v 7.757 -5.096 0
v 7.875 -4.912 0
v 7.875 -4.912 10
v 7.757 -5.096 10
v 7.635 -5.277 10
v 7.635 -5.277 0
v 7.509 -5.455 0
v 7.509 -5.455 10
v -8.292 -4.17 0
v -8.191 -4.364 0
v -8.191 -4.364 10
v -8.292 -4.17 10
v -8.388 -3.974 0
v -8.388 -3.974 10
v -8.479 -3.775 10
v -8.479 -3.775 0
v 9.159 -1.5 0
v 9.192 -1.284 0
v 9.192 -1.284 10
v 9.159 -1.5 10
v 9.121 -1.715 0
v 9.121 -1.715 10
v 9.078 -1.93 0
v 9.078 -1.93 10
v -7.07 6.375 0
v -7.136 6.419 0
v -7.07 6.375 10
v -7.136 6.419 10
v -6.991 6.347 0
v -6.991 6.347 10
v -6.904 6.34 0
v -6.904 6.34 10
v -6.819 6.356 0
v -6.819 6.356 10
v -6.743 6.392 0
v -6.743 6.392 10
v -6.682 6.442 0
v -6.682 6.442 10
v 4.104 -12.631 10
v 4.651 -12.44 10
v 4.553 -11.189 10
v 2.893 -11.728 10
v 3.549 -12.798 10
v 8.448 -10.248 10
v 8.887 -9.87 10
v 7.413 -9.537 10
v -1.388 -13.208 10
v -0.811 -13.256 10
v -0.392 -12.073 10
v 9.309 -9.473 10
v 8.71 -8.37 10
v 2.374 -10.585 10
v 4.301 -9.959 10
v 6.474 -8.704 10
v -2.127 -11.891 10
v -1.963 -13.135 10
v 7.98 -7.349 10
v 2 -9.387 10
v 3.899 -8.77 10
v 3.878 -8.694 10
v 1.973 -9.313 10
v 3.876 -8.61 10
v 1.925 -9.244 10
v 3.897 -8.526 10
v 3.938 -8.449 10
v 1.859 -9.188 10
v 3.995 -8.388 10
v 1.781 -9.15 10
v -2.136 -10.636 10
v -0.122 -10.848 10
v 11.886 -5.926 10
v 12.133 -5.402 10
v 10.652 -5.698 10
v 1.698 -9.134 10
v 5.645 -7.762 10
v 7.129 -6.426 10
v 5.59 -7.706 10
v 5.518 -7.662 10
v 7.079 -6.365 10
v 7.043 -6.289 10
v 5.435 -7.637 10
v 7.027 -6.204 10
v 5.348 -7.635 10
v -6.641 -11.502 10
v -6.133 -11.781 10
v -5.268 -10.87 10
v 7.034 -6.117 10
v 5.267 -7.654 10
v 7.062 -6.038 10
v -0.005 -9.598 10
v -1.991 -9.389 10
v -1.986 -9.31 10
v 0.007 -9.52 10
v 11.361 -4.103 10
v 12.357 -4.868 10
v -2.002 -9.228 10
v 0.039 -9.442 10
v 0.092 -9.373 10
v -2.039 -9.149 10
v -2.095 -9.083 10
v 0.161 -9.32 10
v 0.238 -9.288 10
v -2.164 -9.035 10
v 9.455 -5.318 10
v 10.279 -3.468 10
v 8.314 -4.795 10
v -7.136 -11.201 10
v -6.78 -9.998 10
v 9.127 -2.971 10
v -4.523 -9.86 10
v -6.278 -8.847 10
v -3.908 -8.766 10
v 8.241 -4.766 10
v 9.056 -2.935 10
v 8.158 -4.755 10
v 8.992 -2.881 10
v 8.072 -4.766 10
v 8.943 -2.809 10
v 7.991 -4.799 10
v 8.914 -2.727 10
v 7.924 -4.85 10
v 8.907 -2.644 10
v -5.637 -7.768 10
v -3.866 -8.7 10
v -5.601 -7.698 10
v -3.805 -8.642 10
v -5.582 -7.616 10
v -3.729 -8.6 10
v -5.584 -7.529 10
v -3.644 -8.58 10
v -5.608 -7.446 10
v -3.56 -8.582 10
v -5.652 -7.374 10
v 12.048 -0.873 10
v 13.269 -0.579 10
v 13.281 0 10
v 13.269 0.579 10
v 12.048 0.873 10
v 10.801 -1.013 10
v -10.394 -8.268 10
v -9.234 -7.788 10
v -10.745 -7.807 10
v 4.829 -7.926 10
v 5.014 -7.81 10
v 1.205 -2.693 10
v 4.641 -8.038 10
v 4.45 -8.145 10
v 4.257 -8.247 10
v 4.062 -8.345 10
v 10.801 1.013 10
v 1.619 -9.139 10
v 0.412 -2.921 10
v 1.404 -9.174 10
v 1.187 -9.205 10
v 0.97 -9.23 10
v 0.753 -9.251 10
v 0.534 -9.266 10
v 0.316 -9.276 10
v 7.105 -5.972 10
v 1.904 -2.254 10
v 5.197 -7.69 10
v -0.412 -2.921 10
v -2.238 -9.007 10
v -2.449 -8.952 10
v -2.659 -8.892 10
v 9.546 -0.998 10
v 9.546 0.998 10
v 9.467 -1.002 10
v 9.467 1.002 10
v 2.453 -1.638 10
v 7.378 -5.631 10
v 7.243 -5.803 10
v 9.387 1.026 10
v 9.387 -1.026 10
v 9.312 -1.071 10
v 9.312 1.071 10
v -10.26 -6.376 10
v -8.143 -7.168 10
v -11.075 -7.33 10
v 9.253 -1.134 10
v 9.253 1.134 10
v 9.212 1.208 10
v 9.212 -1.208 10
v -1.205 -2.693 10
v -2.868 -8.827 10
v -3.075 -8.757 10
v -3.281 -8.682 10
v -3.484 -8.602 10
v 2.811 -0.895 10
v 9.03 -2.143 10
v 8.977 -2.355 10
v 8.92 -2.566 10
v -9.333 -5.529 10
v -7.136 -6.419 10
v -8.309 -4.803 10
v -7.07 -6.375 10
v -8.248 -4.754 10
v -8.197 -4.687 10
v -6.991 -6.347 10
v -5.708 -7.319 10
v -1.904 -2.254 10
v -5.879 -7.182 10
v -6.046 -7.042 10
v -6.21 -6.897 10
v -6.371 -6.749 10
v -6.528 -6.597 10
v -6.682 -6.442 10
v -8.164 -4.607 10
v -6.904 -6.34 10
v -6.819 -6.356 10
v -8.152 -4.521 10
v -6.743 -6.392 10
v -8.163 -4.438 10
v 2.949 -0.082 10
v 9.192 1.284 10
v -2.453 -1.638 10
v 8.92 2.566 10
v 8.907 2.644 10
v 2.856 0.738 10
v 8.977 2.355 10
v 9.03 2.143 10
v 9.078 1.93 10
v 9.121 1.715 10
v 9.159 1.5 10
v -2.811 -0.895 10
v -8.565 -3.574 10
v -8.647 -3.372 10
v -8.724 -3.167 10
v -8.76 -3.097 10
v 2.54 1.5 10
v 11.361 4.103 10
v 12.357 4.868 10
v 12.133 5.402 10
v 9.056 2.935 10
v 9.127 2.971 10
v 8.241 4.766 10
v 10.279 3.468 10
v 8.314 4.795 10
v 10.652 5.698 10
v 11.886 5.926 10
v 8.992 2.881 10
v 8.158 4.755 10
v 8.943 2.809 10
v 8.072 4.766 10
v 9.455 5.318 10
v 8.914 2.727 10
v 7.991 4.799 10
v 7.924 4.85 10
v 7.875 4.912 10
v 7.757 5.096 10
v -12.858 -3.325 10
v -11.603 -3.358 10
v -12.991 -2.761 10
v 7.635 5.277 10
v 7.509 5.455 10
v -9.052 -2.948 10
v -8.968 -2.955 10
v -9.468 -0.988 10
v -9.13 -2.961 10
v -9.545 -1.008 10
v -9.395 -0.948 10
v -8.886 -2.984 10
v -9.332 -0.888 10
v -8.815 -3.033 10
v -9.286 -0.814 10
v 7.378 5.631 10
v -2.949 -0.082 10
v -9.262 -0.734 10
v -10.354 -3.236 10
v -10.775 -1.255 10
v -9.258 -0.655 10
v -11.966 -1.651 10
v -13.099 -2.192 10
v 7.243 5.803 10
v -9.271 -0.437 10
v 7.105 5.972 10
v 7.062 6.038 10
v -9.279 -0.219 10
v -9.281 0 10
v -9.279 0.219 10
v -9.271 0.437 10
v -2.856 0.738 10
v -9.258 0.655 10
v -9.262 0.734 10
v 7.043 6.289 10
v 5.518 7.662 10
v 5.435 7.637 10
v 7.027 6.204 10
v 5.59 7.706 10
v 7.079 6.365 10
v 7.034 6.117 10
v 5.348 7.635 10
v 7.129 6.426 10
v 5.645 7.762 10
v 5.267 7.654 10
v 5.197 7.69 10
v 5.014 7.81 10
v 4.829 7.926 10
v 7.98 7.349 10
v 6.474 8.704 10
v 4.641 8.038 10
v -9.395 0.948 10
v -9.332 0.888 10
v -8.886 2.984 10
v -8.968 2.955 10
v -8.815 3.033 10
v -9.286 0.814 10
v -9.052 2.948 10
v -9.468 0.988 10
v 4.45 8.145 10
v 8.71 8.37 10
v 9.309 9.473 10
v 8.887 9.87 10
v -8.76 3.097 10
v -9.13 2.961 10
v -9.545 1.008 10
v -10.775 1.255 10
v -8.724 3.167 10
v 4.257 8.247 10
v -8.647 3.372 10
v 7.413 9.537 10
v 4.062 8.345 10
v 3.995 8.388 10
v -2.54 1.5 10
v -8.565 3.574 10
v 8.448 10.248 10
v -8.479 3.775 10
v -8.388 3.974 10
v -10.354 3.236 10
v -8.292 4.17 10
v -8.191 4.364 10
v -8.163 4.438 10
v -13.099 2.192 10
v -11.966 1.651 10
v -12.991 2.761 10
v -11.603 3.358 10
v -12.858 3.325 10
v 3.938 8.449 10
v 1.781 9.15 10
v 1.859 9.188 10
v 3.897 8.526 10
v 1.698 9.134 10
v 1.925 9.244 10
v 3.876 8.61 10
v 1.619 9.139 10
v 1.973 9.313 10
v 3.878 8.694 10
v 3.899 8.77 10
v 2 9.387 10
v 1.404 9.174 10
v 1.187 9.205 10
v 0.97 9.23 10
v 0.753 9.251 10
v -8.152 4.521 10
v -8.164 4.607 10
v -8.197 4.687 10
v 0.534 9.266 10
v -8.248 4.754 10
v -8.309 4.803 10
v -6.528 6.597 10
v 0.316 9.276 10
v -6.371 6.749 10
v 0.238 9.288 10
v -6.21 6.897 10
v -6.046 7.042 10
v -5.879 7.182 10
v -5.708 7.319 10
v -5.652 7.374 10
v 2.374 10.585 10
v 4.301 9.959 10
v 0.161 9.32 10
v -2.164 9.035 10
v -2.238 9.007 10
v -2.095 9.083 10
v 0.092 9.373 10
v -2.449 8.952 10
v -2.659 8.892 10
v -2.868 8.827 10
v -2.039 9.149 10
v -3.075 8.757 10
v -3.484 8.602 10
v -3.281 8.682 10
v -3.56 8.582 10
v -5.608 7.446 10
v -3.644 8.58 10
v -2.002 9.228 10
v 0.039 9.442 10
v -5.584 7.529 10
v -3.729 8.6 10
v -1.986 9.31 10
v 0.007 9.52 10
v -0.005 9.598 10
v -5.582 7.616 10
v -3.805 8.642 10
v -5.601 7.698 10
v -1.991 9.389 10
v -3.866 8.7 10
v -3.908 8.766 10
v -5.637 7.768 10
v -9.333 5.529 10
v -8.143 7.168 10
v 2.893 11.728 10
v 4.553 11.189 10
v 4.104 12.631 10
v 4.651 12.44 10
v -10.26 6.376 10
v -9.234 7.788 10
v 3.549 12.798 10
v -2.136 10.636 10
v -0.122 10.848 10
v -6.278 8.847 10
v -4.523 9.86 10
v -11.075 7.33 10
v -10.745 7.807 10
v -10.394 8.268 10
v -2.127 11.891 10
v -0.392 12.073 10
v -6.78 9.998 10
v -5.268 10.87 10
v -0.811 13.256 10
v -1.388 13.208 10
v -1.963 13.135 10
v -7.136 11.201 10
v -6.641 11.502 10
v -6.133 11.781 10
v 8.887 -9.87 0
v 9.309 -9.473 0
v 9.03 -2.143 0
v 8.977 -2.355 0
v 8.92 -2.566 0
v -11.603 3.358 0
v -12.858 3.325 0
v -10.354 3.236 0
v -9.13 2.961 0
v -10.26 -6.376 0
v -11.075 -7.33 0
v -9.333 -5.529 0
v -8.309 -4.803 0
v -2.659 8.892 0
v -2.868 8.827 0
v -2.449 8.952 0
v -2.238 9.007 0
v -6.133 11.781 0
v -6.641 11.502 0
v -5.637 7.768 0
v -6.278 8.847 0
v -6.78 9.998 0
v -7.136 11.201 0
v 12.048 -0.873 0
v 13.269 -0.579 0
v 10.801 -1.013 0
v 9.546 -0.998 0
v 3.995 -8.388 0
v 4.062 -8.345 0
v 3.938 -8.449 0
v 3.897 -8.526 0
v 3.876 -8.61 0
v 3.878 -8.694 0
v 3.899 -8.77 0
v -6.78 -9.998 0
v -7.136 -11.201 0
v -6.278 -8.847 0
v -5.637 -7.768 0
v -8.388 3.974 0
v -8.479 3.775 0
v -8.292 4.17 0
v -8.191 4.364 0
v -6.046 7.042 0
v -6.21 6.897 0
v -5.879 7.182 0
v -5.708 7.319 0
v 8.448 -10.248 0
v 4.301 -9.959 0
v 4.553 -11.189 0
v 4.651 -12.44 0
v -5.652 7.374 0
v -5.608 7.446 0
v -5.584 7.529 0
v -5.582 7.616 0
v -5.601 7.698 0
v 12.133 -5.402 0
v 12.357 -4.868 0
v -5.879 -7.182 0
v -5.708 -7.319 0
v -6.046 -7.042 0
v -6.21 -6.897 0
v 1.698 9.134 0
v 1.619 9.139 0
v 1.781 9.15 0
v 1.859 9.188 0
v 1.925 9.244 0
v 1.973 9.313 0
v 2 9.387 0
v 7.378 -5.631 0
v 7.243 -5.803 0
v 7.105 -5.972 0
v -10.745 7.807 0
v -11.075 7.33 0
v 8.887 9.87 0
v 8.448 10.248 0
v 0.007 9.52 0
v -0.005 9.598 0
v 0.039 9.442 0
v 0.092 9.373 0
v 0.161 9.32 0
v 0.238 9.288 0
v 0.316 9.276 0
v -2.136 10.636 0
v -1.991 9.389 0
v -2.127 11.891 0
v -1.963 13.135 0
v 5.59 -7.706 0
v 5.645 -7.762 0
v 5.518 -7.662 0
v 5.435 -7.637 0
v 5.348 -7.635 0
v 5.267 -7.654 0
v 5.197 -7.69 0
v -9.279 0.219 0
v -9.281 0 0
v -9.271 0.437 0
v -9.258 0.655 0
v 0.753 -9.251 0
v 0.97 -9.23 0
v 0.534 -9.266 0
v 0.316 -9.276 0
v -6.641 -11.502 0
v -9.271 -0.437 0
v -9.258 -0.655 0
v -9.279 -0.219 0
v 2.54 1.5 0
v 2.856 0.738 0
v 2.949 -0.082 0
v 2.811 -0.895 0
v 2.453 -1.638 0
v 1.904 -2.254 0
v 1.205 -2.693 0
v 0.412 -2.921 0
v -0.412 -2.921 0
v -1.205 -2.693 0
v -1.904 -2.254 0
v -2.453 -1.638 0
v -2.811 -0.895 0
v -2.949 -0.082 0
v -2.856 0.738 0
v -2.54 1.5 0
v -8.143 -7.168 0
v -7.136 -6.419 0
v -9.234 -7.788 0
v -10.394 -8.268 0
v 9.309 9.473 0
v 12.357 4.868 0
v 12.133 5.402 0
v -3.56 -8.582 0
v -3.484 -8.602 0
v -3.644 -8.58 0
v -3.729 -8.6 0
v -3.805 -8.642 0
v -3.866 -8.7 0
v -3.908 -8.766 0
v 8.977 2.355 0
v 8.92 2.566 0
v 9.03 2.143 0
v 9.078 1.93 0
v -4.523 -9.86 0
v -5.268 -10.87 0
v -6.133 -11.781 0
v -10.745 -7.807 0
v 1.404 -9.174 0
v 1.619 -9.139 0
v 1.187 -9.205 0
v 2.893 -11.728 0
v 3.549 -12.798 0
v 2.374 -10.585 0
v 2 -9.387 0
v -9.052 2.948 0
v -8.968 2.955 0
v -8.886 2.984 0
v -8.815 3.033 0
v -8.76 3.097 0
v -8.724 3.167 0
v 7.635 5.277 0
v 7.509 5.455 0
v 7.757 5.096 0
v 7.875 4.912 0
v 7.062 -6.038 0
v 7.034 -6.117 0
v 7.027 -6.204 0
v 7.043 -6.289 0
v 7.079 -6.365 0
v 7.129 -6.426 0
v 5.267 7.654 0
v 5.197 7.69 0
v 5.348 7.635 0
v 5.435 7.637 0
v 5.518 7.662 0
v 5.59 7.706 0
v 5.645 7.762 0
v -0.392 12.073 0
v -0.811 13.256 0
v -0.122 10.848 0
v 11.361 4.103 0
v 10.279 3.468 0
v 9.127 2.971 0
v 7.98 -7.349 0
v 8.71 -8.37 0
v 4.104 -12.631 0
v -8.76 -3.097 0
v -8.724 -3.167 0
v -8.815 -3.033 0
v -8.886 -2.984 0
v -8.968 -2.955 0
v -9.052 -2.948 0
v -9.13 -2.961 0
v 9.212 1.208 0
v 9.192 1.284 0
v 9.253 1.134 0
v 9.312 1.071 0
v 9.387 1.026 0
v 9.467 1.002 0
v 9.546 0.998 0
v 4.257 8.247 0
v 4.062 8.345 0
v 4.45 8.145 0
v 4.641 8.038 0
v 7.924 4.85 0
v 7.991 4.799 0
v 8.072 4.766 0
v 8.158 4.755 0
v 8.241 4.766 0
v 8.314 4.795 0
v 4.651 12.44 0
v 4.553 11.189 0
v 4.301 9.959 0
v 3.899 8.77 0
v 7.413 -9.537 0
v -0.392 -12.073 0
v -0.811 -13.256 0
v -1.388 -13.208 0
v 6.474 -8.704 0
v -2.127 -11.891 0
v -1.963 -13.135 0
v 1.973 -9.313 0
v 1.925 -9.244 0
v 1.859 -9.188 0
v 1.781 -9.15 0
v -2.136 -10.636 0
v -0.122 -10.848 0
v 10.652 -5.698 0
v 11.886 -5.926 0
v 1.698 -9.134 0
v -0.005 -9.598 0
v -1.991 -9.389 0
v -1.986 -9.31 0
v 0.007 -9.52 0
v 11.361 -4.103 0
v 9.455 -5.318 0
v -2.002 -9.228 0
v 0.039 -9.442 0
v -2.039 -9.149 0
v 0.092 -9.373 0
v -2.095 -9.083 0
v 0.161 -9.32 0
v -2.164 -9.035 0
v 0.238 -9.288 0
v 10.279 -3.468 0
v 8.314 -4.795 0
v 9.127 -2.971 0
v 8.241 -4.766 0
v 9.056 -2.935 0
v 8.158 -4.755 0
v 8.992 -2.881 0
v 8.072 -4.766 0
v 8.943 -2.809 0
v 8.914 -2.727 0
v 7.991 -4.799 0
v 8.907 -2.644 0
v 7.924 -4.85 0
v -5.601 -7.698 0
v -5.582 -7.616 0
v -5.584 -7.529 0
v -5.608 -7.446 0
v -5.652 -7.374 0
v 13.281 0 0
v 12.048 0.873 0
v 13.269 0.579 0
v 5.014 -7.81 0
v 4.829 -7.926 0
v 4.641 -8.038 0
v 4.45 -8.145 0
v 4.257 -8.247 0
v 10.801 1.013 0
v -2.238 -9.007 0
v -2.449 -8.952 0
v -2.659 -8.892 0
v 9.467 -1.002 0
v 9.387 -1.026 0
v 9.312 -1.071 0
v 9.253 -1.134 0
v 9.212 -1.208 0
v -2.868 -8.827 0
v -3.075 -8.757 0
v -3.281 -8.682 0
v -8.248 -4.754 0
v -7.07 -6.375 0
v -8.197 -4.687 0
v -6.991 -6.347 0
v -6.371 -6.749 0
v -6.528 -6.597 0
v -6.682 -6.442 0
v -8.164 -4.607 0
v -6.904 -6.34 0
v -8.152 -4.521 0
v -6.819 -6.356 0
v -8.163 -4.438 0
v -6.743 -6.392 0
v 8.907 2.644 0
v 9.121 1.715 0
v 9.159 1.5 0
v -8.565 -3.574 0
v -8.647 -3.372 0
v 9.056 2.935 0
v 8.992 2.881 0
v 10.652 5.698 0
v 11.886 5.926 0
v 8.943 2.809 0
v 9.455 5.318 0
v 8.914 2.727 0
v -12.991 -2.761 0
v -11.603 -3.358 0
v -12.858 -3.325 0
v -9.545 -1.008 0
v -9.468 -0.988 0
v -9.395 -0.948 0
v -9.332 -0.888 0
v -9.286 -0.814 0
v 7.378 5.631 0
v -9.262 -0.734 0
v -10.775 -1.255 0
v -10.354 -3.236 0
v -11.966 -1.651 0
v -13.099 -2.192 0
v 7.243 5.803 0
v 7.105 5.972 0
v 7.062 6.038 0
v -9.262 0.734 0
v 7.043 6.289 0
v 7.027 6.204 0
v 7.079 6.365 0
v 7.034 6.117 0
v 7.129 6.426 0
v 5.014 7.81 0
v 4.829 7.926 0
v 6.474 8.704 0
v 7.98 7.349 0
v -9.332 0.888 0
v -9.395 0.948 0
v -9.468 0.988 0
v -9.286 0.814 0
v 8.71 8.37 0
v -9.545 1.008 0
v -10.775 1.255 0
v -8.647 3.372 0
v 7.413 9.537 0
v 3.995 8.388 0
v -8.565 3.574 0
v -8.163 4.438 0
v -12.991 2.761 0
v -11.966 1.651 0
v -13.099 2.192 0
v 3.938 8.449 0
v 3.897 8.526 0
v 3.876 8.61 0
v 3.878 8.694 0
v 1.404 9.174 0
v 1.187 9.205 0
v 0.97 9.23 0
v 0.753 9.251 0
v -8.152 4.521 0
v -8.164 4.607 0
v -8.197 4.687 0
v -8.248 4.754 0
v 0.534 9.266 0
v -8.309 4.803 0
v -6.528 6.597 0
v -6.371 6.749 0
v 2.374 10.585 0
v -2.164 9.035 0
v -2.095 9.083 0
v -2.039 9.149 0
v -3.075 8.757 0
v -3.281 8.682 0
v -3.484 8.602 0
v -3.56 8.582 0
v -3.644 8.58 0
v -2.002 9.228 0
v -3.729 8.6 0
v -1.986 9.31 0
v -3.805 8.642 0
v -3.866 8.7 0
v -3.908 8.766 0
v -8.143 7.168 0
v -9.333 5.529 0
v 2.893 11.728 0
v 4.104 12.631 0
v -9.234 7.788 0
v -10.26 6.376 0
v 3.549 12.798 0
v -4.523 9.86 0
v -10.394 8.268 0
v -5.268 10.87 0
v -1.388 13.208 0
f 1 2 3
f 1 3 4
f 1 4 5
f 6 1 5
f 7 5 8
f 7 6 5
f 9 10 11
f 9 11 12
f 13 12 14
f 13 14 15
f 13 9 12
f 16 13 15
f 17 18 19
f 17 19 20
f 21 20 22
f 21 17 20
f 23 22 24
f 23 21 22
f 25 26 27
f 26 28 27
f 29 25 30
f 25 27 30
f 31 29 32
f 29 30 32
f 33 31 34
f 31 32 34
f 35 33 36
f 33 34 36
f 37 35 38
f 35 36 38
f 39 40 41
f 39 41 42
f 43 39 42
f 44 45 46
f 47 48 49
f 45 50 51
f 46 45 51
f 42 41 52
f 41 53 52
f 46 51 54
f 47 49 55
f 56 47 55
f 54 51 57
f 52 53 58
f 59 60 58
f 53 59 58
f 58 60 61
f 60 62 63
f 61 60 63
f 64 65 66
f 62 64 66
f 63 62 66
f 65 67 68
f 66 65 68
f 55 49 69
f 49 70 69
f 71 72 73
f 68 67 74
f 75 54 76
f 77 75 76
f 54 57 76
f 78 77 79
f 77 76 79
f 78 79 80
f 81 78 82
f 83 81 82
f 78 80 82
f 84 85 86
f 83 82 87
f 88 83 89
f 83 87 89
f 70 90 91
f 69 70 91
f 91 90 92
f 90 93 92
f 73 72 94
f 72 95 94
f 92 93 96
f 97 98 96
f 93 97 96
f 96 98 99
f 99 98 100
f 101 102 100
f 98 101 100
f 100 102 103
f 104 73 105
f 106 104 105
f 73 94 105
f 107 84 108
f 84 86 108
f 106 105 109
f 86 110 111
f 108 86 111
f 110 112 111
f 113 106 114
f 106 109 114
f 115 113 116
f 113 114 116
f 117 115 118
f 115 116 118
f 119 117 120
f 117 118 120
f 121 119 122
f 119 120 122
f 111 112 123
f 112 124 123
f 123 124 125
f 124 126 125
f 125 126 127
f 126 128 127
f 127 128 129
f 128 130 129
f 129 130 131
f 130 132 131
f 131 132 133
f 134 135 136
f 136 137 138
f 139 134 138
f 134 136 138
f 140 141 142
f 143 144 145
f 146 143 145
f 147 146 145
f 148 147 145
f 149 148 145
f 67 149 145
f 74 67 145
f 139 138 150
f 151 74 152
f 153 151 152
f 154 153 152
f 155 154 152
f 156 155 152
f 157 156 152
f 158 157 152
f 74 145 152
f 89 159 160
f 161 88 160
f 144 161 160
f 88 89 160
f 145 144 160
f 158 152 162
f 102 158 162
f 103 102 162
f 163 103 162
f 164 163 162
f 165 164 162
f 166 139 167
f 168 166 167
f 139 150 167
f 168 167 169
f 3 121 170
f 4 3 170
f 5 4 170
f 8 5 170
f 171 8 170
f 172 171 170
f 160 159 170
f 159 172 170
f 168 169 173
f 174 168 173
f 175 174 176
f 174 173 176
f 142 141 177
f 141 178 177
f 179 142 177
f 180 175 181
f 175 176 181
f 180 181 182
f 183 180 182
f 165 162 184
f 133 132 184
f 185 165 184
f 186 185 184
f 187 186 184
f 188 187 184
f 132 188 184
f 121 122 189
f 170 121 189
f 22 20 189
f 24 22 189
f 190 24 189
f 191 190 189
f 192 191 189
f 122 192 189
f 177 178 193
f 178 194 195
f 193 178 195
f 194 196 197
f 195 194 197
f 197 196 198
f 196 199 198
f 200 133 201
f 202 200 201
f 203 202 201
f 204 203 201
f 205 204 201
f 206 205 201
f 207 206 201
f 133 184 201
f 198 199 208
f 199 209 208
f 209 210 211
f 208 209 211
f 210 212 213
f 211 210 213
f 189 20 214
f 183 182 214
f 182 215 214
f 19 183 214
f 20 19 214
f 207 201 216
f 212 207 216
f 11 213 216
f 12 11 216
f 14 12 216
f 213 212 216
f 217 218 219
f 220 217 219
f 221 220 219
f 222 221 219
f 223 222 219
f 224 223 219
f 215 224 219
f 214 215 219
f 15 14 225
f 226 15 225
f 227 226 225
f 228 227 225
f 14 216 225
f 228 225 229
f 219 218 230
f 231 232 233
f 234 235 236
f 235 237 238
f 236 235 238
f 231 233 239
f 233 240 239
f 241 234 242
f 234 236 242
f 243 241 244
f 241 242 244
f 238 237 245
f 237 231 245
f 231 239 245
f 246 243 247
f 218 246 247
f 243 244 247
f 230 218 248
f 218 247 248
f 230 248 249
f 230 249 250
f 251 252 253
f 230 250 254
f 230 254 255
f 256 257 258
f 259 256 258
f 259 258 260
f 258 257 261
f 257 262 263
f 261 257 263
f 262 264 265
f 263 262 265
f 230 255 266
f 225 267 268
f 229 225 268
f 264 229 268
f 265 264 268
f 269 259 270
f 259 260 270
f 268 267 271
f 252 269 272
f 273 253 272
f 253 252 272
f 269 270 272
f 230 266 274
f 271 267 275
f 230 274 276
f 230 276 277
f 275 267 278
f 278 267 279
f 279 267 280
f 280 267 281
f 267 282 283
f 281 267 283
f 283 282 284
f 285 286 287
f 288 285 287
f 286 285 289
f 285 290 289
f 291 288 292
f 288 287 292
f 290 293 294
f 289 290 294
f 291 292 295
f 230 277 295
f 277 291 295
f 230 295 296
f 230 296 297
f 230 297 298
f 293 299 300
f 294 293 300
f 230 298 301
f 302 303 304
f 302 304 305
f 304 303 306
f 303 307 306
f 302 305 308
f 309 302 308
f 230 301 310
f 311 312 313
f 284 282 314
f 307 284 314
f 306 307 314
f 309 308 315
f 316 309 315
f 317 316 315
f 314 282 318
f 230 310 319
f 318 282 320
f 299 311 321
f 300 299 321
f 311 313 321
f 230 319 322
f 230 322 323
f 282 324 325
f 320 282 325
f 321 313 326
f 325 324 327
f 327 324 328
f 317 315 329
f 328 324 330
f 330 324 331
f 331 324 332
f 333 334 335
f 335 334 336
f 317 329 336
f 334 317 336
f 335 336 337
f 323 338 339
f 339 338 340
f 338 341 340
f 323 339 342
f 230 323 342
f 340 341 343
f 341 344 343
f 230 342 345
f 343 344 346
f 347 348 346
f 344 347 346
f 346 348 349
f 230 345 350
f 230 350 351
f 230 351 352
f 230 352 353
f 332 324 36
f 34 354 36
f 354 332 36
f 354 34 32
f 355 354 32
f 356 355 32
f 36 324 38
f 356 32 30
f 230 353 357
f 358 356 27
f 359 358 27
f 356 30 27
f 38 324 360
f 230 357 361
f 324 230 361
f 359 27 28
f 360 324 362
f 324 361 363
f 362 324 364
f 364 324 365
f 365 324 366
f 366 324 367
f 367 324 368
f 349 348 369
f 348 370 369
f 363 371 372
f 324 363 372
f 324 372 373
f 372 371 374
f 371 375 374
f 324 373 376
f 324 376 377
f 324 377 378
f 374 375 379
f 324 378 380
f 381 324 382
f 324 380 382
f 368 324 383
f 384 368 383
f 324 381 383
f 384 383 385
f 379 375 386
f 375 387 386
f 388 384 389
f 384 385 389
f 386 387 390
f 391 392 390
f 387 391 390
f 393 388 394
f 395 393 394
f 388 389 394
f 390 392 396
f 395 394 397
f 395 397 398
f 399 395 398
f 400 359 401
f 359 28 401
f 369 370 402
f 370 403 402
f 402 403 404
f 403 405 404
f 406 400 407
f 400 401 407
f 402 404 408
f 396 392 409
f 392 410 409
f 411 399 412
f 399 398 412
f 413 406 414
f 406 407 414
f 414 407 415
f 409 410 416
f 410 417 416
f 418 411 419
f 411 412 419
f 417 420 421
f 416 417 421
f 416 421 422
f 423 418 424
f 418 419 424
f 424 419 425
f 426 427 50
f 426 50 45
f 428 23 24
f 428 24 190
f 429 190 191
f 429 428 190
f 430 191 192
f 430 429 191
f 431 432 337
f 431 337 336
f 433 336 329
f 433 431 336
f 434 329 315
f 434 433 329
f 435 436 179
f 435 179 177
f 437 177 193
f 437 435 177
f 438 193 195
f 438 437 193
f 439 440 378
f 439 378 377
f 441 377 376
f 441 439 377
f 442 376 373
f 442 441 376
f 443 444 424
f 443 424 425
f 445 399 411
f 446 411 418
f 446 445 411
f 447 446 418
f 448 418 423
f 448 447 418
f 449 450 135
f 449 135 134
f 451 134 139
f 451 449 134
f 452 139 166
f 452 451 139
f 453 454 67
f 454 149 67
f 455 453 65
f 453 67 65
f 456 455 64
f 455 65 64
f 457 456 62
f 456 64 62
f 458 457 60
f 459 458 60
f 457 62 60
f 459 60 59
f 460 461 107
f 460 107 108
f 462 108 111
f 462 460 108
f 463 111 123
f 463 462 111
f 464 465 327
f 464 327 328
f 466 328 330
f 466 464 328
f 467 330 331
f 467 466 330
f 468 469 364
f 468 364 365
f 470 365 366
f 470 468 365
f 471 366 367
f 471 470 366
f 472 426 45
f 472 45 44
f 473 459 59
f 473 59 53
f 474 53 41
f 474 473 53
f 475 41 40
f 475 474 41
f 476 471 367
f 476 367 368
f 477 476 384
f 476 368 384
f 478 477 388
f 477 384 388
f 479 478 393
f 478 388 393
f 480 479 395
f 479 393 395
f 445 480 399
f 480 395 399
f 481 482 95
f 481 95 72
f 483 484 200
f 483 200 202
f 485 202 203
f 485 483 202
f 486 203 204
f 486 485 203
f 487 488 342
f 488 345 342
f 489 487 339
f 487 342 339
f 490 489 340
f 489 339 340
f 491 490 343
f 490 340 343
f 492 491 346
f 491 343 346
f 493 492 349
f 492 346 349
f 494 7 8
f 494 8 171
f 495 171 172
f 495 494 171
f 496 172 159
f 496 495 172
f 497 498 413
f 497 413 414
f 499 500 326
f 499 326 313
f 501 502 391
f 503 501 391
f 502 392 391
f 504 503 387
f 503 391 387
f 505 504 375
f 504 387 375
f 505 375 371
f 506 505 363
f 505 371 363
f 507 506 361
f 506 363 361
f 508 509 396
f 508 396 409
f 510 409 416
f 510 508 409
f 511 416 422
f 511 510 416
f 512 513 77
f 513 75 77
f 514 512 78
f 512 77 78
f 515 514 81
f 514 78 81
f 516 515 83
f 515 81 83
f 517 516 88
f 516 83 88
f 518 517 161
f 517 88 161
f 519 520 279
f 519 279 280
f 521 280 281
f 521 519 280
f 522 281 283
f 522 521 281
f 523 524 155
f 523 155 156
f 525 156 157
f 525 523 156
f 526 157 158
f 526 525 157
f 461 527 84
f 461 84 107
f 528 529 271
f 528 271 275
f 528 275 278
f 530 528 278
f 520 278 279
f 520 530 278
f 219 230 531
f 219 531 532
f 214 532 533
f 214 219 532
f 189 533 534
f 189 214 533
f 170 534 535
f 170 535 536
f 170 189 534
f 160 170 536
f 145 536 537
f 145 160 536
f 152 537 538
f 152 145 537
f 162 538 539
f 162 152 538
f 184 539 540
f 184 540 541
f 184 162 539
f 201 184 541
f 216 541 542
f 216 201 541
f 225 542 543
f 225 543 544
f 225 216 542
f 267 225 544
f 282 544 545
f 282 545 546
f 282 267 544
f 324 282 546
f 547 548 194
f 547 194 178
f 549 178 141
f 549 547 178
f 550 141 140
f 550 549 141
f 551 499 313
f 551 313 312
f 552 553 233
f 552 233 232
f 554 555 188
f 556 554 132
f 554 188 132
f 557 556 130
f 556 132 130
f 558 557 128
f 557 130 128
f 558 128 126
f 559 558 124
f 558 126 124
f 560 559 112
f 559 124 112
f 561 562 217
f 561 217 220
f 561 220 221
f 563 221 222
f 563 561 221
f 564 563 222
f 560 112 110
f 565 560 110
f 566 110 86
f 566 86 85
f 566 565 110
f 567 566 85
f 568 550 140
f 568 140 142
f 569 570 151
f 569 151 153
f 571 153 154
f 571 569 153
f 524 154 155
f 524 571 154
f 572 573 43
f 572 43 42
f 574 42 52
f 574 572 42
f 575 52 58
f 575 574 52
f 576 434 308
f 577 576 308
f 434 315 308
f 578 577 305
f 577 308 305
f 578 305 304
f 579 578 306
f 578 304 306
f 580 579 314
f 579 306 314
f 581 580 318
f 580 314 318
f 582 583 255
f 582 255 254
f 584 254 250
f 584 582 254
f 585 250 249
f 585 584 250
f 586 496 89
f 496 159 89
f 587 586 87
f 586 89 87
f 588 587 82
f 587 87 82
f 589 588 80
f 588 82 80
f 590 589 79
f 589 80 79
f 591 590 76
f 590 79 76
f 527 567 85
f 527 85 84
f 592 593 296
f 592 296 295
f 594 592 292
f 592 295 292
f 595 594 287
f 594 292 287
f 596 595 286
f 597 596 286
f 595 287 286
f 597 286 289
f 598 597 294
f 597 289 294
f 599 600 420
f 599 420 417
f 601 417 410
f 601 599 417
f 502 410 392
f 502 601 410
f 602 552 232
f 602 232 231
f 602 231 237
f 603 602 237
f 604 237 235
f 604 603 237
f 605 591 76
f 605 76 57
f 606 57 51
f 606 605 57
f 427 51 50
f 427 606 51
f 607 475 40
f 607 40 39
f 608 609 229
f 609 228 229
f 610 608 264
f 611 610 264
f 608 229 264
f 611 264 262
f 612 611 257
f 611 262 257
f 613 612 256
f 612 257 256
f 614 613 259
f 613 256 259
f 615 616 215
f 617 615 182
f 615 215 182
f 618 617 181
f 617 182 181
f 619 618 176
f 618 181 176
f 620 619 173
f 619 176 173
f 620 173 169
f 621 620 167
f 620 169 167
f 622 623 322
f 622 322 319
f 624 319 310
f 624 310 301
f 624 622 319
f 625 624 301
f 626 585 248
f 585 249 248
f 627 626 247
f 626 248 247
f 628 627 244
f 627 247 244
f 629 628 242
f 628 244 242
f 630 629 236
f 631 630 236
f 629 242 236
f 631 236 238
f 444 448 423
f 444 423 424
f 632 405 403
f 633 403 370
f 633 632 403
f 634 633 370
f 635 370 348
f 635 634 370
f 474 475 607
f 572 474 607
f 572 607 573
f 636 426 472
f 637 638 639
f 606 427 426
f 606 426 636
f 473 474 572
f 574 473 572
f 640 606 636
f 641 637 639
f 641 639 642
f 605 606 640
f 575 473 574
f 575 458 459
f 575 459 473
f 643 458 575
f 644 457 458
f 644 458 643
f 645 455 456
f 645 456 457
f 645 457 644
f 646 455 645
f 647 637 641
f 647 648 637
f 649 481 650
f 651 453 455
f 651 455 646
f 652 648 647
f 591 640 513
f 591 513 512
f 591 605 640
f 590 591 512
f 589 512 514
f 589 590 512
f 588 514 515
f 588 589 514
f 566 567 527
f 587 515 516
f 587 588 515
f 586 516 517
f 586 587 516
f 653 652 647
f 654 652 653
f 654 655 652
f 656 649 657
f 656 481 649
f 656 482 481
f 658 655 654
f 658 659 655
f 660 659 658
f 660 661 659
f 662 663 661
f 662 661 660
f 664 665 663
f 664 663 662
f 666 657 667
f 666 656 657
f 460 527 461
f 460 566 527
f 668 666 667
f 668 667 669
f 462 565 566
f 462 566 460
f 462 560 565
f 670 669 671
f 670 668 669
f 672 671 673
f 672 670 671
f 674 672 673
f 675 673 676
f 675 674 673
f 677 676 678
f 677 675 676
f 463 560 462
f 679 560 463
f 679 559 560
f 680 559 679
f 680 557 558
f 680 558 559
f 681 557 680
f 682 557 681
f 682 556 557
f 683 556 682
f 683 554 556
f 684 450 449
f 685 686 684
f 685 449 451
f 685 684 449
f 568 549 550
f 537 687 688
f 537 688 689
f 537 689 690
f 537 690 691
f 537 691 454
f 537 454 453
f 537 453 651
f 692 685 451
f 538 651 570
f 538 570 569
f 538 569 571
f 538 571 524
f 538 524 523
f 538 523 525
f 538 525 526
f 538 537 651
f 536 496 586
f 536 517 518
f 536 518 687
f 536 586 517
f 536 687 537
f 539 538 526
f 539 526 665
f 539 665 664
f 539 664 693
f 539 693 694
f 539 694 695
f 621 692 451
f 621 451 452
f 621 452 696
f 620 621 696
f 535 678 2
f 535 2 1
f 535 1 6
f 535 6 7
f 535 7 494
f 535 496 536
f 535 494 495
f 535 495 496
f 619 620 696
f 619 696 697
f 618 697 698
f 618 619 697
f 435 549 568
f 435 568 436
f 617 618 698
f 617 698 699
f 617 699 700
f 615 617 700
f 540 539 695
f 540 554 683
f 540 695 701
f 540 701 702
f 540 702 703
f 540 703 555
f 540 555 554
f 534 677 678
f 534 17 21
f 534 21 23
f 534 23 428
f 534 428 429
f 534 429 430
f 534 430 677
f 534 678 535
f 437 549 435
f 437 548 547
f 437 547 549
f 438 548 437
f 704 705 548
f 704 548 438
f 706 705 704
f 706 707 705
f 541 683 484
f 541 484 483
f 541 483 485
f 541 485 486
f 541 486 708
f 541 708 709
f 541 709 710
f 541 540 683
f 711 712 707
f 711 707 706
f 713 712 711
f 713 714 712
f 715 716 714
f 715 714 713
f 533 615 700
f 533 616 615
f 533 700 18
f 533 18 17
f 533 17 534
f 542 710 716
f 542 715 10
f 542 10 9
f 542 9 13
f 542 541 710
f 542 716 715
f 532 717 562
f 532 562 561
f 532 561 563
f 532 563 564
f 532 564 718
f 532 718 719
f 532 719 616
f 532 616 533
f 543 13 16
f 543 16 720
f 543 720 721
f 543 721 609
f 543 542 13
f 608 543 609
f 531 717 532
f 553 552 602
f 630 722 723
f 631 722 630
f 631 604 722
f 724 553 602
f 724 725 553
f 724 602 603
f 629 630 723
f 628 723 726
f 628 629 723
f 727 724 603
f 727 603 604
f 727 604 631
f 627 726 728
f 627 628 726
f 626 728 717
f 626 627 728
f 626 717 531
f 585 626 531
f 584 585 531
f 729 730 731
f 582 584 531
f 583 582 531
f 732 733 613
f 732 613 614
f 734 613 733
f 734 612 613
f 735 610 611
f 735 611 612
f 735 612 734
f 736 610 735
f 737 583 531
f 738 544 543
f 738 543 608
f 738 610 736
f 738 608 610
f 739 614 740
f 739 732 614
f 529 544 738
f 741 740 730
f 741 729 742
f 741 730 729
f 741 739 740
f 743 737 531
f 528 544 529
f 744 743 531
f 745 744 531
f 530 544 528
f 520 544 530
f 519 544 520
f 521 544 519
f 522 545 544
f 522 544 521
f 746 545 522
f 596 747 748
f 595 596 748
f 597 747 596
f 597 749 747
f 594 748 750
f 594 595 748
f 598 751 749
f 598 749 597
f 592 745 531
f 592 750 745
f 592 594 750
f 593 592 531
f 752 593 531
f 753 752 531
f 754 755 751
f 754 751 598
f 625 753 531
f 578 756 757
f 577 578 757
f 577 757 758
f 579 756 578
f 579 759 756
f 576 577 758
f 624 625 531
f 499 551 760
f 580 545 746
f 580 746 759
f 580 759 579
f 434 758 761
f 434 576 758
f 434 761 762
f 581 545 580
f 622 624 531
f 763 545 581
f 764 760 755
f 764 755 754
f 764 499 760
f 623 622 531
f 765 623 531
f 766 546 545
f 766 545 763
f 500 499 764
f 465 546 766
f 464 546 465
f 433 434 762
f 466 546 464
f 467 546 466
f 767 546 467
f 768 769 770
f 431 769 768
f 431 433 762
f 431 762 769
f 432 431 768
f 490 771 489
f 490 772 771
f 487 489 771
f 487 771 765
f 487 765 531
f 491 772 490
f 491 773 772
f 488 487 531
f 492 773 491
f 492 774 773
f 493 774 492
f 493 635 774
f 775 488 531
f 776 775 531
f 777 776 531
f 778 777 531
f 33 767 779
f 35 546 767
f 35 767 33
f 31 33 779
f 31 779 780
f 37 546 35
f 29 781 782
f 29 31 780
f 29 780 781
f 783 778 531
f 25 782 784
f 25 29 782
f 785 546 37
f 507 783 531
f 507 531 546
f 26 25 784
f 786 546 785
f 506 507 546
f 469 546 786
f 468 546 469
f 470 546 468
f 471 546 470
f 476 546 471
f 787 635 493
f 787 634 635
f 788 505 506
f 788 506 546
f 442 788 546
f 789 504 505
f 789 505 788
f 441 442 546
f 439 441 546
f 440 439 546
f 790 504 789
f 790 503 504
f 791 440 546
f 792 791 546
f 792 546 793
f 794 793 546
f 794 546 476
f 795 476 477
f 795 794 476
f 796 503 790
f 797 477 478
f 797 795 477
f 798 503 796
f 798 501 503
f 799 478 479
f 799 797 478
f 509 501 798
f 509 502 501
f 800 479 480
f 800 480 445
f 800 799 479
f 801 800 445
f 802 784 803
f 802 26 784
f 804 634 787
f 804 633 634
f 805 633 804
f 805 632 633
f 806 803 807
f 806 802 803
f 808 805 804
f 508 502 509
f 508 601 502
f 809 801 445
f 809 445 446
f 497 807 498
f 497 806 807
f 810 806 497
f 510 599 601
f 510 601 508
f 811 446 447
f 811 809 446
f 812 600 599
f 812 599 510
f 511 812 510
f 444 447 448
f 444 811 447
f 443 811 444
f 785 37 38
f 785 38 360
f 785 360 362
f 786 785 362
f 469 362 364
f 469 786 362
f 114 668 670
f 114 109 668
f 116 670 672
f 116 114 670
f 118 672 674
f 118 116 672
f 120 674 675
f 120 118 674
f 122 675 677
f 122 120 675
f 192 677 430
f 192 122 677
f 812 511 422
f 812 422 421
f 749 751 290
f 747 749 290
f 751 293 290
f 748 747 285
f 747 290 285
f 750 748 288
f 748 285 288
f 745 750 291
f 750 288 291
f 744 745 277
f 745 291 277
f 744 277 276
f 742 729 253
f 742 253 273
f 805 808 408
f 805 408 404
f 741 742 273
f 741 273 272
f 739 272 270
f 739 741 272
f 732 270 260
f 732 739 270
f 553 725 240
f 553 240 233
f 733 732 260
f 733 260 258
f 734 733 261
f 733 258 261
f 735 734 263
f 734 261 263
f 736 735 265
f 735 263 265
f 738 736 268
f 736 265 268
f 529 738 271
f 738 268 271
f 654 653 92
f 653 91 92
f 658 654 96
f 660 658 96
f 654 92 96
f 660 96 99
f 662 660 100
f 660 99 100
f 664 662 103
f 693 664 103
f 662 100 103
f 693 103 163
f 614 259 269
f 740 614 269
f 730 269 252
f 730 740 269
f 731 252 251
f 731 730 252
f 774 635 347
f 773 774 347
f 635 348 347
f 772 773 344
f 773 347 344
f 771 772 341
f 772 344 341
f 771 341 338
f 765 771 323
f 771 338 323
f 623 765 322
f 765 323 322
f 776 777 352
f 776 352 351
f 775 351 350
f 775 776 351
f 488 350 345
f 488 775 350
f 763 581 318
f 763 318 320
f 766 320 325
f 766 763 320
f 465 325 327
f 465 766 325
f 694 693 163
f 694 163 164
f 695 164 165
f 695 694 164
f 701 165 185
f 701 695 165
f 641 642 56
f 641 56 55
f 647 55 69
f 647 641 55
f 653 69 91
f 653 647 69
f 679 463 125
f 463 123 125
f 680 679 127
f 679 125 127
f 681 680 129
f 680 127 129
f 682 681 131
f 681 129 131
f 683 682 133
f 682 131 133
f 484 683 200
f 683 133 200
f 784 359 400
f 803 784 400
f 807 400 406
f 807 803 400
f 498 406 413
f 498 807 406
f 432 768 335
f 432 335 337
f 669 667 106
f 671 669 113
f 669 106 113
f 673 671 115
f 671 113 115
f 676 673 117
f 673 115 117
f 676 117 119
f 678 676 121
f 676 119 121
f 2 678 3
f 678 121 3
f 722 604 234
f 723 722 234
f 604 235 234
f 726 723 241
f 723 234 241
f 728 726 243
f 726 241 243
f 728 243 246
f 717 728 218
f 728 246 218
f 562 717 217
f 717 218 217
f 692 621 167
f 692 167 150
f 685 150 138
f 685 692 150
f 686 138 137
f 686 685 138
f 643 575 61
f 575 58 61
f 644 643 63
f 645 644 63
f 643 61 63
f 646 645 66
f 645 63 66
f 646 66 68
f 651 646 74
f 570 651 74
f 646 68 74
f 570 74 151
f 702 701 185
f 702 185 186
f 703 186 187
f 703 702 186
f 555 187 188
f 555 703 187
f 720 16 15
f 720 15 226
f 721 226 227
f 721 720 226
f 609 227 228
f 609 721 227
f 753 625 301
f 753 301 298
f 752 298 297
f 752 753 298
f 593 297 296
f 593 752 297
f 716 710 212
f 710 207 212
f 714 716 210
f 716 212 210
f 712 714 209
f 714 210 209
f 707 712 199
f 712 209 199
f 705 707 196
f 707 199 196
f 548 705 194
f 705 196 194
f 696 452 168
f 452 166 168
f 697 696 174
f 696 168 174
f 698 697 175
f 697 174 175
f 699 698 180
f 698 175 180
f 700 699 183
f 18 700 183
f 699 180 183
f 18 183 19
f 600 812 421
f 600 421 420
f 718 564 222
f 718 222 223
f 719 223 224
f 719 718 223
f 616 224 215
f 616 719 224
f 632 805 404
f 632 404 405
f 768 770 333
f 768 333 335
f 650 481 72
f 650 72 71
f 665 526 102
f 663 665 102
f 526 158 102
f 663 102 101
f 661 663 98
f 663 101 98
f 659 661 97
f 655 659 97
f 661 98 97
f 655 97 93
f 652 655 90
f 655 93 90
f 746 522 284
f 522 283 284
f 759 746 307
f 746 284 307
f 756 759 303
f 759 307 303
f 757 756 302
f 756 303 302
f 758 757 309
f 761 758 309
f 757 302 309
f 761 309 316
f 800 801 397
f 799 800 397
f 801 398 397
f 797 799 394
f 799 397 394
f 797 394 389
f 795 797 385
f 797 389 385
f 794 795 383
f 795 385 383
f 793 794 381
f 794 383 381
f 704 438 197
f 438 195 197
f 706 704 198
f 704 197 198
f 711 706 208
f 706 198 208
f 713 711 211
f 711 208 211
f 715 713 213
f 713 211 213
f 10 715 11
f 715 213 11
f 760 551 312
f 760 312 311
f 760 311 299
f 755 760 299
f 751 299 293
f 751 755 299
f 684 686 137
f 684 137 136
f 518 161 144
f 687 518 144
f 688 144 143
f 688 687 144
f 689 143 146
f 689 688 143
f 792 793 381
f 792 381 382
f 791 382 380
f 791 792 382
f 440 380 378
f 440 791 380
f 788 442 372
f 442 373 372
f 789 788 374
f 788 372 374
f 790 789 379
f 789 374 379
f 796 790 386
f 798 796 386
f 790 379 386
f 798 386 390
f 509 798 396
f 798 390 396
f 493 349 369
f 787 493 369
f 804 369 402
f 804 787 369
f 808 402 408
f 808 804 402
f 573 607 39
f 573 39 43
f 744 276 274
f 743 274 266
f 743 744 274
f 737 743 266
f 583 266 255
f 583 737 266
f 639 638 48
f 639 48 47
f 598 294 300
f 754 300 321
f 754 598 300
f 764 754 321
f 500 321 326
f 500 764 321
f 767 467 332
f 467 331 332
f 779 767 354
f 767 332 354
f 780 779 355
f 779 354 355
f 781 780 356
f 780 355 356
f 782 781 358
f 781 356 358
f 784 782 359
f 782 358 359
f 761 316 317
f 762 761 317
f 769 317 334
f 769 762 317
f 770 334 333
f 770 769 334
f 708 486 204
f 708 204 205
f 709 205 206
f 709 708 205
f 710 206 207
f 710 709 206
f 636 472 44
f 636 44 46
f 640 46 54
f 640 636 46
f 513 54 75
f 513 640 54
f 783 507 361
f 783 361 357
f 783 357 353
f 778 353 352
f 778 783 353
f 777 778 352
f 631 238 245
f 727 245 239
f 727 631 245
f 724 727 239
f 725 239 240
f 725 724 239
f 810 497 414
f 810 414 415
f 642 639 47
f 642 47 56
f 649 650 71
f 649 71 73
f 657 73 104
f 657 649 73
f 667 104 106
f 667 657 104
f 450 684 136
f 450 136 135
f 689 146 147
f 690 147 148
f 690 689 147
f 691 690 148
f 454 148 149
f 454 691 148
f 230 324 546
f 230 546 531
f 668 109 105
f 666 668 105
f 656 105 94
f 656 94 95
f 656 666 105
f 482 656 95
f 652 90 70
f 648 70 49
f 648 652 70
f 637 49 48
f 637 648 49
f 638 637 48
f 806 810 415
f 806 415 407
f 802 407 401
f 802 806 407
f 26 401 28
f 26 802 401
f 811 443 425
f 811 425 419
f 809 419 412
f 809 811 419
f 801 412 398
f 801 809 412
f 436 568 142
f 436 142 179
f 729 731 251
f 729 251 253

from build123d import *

# Parameters (mm, degrees)
BOSS_EXTRUDE1_DEPTH      = 10
FILLET1_R                = 0.3325
CIRPATTERN1_COUNT        = 15
FILLET1_OF_CIRPATTERN1_R = 0.3325
CUT_EXTRUDE1_START       = -10
CUT_EXTRUDE1_DEPTH       = 10


# Read off the part's stored shape, not the designer's step: Cut-Extrude1
with BuildPart() as part:
    # Sketch1 → Boss-Extrude1 (new body)
    with BuildSketch(Plane.XY):
        with BuildLine():
            Line((13.268609193, 0.579319988), (13.28125, 0))
            Line((13.28125, 0), (13.268609193, -0.579319988))
            ThreePointArc((13.268609193, -0.579319988), (11.2692337, -0.978550661), (9.230406341, -0.9701548))
            ThreePointArc((9.230406341, -0.9701548), (9.166982411, -1.451907379), (9.078432419, -1.92968038))
            Line((9.078432419, -1.92968038), (0, 0))
            Line((0, 0), (9.078432419, 1.92968038))
            ThreePointArc((9.078432419, 1.92968038), (9.166982411, 1.451907379), (9.230406341, 0.9701548))
            ThreePointArc((9.230406341, 0.9701548), (11.2692337, 0.978550661), (13.268609193, 0.579319988))
        make_face()
    boss_extrude1 = extrude(amount=BOSS_EXTRUDE1_DEPTH)

    # Fillet1
    fillet1_edges = [part.edges().sort_by_distance(p)[0] for p in [
        (9.230406341, 0.9701548, 5),
        (9.230406341, -0.9701548, 5),
    ]]
    fillet(fillet1_edges, radius=FILLET1_R)

    # CirPattern1: Boss-Extrude1 ×15 about axis
    cirpattern1_axis = Axis((0, 0, 0), (0, 0, 1))
    for i in range(1, CIRPATTERN1_COUNT):
        add(boss_extrude1.rotate(cirpattern1_axis, i * 360 / CIRPATTERN1_COUNT))

    # Fillet1 of CirPattern1
    fillet1_of_cirpattern1_edges = [part.edges().sort_by_distance(p)[0] for p in [
        (8.037798279, 4.640625, 5),
        (8.826993292, 2.868063979, 5),
        (5.455381873, 7.508688979, 5),
        (6.897312911, 6.21036844, 5),
        (1.92968038, 9.078432419, 5),
        (3.775024469, 8.478843779, 5),
        (-1.92968038, 9.078432419, 5),
        (0, 9.28125, 5),
        (-5.455381873, 7.508688979, 5),
        (-3.775024469, 8.478843779, 5),
        (-8.037798279, 4.640625, 5),
        (-6.897312911, 6.21036844, 5),
        (-9.230406341, 0.9701548, 5),
        (-8.826993292, 2.868063979, 5),
        (-8.826993292, -2.868063979, 5),
        (-9.230406341, -0.9701548, 5),
        (-6.897312911, -6.21036844, 5),
        (-8.037798279, -4.640625, 5),
        (-3.775024469, -8.478843779, 5),
        (-5.455381873, -7.508688979, 5),
        (0, -9.28125, 5),
        (-1.92968038, -9.078432419, 5),
        (3.775024469, -8.478843779, 5),
        (1.92968038, -9.078432419, 5),
        (6.897312911, -6.21036844, 5),
        (5.455381873, -7.508688979, 5),
        (8.826993292, -2.868063979, 5),
        (8.037798279, -4.640625, 5),
    ]]
    fillet(fillet1_of_cirpattern1_edges, radius=FILLET1_OF_CIRPATTERN1_R)

    # Cut-Extrude1 outline → Cut-Extrude1 (cut)
    with BuildSketch(Plane(origin=(0, 0, 0), x_dir=(-1, 0, 0), z_dir=(0, 0, -1)).offset(CUT_EXTRUDE1_START)):
        with BuildLine():
            Line((2.540177159, 1.5), (-2.540177159, 1.5))
            ThreePointArc((-2.540177159, 1.5), (0, -2.95), (2.540177159, 1.5))
        make_face()
    extrude(amount=CUT_EXTRUDE1_DEPTH, mode=Mode.SUBTRACT)


solid = part.part
